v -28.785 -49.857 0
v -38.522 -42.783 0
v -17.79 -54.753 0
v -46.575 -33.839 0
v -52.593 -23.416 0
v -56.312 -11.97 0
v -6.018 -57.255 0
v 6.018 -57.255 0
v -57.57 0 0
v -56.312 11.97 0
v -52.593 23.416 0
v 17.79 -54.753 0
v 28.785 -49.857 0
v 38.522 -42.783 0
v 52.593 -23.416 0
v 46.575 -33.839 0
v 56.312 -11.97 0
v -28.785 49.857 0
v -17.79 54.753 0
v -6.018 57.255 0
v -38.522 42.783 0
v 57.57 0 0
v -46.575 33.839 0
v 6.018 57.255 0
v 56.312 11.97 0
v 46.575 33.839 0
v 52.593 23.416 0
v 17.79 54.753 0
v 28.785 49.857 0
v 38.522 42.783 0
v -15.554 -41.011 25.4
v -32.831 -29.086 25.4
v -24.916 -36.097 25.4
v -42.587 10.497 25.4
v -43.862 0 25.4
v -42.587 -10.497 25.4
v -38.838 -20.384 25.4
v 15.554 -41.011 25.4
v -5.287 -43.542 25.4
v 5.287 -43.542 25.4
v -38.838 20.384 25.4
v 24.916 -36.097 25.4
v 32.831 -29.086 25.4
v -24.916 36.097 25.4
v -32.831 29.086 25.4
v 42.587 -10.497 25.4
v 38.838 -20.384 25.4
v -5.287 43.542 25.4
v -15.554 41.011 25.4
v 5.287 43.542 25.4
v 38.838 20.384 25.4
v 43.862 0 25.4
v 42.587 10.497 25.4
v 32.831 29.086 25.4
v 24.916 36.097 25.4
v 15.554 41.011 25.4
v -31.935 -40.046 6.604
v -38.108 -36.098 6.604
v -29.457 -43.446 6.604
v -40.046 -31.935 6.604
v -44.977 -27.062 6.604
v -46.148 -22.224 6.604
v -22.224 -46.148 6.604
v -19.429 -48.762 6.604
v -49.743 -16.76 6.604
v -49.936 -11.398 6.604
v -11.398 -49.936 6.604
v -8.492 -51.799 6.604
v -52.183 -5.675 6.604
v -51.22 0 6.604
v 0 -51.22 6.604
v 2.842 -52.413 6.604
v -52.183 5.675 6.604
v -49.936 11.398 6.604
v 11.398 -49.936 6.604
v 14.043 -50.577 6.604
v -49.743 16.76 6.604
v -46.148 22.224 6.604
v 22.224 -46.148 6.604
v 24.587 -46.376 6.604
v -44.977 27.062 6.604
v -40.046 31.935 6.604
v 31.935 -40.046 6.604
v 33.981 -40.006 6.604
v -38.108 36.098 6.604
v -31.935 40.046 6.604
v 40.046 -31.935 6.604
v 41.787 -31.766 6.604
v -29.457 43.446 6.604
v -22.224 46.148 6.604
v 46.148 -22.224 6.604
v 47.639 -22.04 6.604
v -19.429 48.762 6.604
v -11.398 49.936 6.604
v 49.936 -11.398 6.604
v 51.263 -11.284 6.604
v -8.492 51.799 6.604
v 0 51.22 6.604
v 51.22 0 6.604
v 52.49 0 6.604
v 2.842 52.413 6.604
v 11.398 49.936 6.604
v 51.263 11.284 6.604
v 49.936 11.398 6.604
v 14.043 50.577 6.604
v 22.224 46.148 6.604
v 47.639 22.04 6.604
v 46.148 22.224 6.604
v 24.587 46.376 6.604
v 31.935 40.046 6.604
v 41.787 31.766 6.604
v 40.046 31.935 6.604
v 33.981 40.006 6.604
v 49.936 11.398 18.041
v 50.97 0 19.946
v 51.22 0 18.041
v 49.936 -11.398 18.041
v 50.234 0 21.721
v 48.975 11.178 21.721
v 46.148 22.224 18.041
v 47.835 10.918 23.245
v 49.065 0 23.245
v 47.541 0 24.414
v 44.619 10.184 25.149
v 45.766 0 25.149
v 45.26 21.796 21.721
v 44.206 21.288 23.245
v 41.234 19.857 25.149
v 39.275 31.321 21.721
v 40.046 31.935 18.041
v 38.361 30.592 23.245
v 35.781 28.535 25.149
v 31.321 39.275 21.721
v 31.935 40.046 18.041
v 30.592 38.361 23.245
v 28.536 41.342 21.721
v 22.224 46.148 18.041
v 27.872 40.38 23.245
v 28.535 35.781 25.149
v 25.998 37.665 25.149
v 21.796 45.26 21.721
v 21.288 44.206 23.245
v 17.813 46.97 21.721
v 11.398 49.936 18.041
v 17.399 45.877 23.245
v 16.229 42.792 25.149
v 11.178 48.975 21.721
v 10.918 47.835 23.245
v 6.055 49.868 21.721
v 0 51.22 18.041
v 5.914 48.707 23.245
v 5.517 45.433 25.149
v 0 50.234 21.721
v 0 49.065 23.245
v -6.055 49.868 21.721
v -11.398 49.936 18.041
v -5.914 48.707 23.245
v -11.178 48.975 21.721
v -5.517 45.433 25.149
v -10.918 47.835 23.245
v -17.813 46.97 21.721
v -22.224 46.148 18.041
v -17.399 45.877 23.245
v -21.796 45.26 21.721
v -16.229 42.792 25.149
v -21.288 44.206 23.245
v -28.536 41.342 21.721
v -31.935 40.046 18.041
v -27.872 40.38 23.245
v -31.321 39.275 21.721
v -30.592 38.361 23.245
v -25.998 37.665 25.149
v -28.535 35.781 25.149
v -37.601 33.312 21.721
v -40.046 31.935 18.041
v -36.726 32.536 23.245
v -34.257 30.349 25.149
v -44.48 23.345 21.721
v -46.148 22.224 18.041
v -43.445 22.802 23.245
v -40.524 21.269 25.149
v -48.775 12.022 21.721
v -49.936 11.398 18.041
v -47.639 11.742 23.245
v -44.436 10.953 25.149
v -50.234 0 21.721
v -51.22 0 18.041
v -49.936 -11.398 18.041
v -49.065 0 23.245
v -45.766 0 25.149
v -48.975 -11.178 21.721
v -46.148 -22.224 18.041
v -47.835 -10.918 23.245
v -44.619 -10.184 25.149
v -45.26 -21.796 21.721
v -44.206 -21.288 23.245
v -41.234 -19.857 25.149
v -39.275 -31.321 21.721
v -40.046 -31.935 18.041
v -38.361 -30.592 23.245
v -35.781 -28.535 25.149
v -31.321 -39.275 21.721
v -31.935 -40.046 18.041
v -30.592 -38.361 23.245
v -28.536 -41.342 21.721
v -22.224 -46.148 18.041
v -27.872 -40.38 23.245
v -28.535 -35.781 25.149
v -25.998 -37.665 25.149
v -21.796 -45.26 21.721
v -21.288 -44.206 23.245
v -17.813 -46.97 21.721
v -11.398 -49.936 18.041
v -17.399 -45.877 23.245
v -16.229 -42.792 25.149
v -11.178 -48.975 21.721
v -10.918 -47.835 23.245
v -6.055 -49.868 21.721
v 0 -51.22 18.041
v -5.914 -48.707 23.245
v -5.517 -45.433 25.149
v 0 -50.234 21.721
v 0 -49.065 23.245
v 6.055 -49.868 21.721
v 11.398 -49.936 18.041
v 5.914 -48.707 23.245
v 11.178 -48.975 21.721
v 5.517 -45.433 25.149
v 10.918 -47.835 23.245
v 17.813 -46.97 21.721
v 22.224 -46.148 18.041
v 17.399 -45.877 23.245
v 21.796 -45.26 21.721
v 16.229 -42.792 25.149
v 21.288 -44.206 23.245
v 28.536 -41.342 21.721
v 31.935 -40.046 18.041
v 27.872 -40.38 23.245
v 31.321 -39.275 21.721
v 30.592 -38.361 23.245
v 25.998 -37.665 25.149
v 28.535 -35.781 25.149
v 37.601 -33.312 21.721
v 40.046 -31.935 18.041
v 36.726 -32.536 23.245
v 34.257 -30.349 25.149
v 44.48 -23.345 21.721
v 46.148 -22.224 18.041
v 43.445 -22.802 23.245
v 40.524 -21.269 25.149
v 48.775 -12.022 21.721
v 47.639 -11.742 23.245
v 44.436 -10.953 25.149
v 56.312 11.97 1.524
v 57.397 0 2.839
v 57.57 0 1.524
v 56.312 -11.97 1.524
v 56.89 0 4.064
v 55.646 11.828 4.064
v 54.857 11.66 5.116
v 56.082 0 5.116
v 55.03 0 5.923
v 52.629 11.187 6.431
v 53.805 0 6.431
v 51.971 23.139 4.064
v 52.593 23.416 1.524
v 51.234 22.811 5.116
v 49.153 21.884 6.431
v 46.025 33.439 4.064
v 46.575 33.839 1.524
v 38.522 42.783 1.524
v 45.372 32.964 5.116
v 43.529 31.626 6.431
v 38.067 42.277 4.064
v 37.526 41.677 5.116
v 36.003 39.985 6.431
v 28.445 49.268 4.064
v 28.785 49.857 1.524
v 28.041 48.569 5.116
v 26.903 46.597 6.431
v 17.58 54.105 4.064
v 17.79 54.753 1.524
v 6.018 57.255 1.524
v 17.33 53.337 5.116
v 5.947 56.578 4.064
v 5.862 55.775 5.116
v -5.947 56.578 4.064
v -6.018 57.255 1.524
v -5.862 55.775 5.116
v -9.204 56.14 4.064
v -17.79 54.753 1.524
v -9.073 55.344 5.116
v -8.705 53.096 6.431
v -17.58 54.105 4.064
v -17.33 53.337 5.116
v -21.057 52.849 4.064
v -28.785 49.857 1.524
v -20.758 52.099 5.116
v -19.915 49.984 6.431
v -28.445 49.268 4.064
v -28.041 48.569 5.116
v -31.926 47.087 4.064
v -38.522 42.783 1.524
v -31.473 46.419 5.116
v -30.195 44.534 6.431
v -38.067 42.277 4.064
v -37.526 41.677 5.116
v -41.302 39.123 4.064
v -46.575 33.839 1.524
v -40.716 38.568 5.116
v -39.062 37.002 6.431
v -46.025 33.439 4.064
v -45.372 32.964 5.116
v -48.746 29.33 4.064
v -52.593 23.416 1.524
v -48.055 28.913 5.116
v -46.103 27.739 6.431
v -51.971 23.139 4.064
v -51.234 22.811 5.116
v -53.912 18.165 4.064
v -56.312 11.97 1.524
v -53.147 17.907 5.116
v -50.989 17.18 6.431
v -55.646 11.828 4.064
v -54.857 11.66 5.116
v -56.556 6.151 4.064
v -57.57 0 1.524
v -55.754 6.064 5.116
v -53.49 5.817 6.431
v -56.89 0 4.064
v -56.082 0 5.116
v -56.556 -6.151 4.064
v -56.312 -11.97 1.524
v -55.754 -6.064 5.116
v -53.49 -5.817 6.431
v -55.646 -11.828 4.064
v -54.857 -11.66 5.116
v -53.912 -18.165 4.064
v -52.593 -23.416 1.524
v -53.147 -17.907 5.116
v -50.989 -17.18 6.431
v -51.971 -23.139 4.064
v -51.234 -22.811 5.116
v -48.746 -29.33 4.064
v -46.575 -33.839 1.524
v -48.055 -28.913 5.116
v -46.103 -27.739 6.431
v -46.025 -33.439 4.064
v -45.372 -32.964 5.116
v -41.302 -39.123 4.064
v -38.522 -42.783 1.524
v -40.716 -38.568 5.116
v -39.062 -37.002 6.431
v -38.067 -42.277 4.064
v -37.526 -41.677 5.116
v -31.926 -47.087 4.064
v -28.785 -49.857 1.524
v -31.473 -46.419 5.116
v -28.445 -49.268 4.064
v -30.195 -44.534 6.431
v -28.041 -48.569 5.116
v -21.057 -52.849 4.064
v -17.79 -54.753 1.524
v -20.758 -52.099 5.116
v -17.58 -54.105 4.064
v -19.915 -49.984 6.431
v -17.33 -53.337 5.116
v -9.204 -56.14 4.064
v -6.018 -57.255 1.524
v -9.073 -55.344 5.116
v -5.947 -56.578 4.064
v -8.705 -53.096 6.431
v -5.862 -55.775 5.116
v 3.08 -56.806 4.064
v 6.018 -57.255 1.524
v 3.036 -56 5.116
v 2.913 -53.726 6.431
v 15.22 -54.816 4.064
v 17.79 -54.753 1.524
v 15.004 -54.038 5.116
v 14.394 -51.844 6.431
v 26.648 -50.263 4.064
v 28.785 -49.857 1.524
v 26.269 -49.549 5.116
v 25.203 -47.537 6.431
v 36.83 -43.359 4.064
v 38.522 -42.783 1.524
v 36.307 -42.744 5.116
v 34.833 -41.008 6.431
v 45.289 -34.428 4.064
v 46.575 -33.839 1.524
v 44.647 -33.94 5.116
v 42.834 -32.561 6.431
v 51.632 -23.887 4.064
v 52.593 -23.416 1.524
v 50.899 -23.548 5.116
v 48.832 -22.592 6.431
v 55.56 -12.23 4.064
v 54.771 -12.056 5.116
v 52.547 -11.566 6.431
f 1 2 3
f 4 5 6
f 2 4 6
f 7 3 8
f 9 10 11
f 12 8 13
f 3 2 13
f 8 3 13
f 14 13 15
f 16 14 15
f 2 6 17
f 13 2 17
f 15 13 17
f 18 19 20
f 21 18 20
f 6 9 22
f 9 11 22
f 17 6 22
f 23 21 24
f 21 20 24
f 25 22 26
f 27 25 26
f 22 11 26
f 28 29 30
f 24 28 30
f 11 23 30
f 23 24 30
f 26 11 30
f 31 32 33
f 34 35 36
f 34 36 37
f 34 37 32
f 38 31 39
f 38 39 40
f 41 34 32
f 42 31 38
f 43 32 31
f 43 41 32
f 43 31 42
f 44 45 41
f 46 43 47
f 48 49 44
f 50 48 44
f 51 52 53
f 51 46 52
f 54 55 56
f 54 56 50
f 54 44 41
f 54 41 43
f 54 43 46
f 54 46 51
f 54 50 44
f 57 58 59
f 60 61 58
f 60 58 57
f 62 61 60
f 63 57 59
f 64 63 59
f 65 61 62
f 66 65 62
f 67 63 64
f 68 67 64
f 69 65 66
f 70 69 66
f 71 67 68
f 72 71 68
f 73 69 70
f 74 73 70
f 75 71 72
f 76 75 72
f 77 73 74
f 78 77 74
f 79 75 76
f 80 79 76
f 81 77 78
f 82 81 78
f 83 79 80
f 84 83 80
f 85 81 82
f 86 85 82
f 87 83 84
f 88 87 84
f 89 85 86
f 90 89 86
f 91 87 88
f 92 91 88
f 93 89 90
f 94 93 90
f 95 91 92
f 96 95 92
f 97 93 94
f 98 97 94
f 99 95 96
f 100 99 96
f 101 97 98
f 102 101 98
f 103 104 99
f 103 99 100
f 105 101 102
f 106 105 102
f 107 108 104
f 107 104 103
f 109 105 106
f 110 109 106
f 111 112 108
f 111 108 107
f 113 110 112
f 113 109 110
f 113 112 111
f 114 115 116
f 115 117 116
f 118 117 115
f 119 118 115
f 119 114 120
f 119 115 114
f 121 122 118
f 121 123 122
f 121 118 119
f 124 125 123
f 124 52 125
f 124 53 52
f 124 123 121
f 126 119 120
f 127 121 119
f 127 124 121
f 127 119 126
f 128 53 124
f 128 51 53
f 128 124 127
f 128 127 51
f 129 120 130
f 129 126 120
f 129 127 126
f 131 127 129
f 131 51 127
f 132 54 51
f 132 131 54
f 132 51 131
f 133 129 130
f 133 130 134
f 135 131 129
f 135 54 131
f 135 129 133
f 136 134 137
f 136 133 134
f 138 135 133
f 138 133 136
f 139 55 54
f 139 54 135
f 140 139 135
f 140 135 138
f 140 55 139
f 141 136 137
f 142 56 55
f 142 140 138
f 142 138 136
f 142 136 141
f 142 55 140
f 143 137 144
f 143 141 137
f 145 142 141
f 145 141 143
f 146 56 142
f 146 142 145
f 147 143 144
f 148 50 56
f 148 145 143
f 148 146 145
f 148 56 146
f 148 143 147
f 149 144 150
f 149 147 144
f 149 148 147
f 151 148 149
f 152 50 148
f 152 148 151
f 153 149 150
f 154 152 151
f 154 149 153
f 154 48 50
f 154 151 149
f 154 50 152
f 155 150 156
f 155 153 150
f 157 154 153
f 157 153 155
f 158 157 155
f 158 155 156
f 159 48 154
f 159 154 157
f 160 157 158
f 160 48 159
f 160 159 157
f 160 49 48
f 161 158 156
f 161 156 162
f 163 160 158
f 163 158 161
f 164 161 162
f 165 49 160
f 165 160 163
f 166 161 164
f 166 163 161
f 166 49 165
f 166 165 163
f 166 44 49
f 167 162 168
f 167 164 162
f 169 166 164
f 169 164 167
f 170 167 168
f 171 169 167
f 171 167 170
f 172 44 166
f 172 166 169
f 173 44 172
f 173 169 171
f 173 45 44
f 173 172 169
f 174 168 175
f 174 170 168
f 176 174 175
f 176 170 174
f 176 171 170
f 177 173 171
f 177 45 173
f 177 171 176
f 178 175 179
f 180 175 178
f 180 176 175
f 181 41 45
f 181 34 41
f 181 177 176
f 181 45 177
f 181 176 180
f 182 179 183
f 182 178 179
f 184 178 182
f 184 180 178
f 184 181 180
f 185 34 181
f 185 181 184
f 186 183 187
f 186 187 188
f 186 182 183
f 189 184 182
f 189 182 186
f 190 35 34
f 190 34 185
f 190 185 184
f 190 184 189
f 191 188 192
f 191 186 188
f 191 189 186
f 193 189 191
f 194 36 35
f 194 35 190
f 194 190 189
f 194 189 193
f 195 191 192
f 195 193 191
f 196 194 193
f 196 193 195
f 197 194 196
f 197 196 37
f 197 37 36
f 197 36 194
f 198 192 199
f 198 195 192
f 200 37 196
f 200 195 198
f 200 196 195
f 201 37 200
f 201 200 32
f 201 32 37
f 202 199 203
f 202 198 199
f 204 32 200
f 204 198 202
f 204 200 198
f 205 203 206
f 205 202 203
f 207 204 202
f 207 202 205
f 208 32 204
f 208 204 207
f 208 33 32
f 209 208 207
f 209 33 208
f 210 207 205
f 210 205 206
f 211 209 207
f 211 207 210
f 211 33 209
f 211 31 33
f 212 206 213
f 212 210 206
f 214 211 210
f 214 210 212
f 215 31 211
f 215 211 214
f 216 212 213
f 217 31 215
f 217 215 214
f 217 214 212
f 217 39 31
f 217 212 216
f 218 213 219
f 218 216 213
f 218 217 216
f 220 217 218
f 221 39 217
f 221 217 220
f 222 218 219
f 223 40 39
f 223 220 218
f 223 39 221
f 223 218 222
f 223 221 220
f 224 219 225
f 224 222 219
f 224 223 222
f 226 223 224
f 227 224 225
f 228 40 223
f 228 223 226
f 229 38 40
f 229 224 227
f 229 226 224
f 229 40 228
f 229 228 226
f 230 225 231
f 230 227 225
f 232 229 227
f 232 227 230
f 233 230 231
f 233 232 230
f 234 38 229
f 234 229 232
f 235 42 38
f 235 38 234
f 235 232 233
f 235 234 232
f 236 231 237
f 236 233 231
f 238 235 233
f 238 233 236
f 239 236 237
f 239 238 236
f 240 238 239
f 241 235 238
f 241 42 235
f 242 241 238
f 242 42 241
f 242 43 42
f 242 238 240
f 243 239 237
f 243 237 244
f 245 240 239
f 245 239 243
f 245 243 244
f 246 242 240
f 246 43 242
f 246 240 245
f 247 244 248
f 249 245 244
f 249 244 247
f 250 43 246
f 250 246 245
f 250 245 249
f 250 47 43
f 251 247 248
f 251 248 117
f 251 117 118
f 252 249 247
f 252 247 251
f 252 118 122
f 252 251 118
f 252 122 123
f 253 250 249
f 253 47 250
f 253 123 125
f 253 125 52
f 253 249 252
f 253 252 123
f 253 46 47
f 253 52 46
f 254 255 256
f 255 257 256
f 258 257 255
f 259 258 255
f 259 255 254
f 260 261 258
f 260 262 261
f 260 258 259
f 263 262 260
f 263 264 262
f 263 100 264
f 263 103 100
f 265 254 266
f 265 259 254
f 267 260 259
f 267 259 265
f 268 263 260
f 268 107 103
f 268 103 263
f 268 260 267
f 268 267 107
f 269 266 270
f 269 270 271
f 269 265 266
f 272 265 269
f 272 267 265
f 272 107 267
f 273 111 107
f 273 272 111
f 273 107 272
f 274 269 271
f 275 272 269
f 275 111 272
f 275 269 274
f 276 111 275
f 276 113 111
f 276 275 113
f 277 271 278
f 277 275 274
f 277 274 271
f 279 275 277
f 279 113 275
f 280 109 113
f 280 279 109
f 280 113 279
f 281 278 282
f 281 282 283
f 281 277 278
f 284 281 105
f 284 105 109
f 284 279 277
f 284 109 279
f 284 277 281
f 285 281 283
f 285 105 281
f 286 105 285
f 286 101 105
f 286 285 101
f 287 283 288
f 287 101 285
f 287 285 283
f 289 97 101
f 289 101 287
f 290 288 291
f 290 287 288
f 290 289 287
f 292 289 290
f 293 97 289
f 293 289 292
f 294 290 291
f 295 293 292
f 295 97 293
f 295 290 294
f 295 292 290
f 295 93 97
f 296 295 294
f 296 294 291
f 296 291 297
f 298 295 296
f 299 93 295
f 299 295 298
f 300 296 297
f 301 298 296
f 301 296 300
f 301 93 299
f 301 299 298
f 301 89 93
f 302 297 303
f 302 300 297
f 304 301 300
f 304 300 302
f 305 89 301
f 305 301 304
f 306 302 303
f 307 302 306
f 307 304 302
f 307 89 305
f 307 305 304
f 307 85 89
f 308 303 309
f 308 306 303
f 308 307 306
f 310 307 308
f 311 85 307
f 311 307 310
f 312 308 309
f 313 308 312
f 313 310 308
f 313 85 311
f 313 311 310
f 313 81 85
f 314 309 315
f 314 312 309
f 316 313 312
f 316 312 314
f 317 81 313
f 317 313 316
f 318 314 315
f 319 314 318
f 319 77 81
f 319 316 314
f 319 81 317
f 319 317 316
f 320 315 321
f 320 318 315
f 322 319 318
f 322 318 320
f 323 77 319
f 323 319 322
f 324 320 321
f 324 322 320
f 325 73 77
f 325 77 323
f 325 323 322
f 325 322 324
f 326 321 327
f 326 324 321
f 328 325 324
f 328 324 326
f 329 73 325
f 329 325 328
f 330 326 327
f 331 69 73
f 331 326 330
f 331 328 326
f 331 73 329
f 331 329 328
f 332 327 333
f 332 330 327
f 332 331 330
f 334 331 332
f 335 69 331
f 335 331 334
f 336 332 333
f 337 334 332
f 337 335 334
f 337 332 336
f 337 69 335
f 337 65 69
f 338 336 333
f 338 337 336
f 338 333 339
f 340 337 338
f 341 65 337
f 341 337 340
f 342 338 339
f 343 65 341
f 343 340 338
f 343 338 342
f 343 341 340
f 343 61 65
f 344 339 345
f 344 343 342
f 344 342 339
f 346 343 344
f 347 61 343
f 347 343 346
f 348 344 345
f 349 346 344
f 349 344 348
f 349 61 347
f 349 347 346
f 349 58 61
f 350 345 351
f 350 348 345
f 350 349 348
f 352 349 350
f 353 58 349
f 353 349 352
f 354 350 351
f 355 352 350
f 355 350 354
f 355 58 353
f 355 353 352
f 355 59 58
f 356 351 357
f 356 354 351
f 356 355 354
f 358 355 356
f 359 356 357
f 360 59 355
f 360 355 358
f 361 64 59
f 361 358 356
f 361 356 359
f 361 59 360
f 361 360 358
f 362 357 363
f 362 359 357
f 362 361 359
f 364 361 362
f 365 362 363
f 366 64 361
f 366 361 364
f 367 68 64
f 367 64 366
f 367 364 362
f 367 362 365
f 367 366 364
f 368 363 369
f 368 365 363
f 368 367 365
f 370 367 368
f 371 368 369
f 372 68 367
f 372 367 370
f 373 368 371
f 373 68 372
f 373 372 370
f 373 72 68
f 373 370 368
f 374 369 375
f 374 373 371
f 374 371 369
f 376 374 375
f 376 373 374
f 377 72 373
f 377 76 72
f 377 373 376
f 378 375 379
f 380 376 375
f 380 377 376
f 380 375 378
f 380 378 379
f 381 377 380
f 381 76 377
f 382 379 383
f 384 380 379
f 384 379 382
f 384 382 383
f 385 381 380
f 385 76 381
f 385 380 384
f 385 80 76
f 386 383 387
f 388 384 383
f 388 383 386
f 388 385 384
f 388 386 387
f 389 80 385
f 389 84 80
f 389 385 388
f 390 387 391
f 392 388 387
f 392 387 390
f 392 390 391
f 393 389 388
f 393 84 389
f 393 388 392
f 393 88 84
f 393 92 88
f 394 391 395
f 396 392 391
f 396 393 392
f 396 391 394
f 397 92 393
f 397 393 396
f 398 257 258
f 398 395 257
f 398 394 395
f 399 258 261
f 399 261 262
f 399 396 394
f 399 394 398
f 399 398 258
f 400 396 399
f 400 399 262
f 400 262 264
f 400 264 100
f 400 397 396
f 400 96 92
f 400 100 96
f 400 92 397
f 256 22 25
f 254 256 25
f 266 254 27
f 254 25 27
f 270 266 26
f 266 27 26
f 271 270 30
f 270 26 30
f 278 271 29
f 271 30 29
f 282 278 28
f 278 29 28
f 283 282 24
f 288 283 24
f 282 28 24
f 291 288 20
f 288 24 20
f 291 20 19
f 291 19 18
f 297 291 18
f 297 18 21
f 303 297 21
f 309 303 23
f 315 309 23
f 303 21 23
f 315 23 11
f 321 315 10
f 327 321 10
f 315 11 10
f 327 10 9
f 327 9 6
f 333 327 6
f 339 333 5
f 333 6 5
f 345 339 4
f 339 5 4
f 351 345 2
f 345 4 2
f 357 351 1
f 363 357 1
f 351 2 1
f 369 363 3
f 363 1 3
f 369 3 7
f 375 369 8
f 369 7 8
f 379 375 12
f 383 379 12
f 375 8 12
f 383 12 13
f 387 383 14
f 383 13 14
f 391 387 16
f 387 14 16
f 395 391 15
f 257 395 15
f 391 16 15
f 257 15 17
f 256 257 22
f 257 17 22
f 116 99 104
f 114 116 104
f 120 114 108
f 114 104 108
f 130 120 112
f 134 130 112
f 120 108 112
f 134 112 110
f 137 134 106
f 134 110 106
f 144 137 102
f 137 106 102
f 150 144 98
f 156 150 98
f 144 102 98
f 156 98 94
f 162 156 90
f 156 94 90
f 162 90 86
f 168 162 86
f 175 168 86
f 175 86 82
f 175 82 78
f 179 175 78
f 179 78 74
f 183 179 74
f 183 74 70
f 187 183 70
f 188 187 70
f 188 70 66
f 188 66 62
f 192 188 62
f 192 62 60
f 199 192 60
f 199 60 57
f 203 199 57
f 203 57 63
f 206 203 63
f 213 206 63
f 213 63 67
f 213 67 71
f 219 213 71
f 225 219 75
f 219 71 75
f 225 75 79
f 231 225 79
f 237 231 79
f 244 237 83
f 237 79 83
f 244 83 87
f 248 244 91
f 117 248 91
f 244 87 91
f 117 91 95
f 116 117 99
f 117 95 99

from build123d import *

# Parameters (mm, degrees)
F0_R     = 51.2202453394
F2_DEPTH = 25.4
F3_R     = 7.3585229381
F0_R_2   = 57.5702453394
F4_DEPTH = 6.604
F5_R     = 5.08


# Not quite as in the source:
# - the program builds the solid bodies; features that only make, move or delete a surface that nothing else refers to are left out


with BuildPart() as f2:
    # F0 (on Top) → F2 (new body)
    with BuildSketch(Plane.XY):
        Circle(F0_R)
    extrude(amount=F2_DEPTH)

    # F3
    f3_edges = [f2.edges().sort_by_distance(p)[0] for p in [
        (-51.220245, 0, 25.4),
    ]]
    fillet(f3_edges, radius=F3_R)

    # F0 (on Top) → F4 (join)
    with BuildSketch(Plane.XY):
        Circle(F0_R_2)
        Circle(F0_R, mode=Mode.SUBTRACT)
    extrude(amount=F4_DEPTH)

    # F5
    f5_edges = [f2.edges().sort_by_distance(p)[0] for p in [
        (-57.570245, 0, 6.604),
    ]]
    fillet(f5_edges, radius=F5_R)


solid = f2.part
